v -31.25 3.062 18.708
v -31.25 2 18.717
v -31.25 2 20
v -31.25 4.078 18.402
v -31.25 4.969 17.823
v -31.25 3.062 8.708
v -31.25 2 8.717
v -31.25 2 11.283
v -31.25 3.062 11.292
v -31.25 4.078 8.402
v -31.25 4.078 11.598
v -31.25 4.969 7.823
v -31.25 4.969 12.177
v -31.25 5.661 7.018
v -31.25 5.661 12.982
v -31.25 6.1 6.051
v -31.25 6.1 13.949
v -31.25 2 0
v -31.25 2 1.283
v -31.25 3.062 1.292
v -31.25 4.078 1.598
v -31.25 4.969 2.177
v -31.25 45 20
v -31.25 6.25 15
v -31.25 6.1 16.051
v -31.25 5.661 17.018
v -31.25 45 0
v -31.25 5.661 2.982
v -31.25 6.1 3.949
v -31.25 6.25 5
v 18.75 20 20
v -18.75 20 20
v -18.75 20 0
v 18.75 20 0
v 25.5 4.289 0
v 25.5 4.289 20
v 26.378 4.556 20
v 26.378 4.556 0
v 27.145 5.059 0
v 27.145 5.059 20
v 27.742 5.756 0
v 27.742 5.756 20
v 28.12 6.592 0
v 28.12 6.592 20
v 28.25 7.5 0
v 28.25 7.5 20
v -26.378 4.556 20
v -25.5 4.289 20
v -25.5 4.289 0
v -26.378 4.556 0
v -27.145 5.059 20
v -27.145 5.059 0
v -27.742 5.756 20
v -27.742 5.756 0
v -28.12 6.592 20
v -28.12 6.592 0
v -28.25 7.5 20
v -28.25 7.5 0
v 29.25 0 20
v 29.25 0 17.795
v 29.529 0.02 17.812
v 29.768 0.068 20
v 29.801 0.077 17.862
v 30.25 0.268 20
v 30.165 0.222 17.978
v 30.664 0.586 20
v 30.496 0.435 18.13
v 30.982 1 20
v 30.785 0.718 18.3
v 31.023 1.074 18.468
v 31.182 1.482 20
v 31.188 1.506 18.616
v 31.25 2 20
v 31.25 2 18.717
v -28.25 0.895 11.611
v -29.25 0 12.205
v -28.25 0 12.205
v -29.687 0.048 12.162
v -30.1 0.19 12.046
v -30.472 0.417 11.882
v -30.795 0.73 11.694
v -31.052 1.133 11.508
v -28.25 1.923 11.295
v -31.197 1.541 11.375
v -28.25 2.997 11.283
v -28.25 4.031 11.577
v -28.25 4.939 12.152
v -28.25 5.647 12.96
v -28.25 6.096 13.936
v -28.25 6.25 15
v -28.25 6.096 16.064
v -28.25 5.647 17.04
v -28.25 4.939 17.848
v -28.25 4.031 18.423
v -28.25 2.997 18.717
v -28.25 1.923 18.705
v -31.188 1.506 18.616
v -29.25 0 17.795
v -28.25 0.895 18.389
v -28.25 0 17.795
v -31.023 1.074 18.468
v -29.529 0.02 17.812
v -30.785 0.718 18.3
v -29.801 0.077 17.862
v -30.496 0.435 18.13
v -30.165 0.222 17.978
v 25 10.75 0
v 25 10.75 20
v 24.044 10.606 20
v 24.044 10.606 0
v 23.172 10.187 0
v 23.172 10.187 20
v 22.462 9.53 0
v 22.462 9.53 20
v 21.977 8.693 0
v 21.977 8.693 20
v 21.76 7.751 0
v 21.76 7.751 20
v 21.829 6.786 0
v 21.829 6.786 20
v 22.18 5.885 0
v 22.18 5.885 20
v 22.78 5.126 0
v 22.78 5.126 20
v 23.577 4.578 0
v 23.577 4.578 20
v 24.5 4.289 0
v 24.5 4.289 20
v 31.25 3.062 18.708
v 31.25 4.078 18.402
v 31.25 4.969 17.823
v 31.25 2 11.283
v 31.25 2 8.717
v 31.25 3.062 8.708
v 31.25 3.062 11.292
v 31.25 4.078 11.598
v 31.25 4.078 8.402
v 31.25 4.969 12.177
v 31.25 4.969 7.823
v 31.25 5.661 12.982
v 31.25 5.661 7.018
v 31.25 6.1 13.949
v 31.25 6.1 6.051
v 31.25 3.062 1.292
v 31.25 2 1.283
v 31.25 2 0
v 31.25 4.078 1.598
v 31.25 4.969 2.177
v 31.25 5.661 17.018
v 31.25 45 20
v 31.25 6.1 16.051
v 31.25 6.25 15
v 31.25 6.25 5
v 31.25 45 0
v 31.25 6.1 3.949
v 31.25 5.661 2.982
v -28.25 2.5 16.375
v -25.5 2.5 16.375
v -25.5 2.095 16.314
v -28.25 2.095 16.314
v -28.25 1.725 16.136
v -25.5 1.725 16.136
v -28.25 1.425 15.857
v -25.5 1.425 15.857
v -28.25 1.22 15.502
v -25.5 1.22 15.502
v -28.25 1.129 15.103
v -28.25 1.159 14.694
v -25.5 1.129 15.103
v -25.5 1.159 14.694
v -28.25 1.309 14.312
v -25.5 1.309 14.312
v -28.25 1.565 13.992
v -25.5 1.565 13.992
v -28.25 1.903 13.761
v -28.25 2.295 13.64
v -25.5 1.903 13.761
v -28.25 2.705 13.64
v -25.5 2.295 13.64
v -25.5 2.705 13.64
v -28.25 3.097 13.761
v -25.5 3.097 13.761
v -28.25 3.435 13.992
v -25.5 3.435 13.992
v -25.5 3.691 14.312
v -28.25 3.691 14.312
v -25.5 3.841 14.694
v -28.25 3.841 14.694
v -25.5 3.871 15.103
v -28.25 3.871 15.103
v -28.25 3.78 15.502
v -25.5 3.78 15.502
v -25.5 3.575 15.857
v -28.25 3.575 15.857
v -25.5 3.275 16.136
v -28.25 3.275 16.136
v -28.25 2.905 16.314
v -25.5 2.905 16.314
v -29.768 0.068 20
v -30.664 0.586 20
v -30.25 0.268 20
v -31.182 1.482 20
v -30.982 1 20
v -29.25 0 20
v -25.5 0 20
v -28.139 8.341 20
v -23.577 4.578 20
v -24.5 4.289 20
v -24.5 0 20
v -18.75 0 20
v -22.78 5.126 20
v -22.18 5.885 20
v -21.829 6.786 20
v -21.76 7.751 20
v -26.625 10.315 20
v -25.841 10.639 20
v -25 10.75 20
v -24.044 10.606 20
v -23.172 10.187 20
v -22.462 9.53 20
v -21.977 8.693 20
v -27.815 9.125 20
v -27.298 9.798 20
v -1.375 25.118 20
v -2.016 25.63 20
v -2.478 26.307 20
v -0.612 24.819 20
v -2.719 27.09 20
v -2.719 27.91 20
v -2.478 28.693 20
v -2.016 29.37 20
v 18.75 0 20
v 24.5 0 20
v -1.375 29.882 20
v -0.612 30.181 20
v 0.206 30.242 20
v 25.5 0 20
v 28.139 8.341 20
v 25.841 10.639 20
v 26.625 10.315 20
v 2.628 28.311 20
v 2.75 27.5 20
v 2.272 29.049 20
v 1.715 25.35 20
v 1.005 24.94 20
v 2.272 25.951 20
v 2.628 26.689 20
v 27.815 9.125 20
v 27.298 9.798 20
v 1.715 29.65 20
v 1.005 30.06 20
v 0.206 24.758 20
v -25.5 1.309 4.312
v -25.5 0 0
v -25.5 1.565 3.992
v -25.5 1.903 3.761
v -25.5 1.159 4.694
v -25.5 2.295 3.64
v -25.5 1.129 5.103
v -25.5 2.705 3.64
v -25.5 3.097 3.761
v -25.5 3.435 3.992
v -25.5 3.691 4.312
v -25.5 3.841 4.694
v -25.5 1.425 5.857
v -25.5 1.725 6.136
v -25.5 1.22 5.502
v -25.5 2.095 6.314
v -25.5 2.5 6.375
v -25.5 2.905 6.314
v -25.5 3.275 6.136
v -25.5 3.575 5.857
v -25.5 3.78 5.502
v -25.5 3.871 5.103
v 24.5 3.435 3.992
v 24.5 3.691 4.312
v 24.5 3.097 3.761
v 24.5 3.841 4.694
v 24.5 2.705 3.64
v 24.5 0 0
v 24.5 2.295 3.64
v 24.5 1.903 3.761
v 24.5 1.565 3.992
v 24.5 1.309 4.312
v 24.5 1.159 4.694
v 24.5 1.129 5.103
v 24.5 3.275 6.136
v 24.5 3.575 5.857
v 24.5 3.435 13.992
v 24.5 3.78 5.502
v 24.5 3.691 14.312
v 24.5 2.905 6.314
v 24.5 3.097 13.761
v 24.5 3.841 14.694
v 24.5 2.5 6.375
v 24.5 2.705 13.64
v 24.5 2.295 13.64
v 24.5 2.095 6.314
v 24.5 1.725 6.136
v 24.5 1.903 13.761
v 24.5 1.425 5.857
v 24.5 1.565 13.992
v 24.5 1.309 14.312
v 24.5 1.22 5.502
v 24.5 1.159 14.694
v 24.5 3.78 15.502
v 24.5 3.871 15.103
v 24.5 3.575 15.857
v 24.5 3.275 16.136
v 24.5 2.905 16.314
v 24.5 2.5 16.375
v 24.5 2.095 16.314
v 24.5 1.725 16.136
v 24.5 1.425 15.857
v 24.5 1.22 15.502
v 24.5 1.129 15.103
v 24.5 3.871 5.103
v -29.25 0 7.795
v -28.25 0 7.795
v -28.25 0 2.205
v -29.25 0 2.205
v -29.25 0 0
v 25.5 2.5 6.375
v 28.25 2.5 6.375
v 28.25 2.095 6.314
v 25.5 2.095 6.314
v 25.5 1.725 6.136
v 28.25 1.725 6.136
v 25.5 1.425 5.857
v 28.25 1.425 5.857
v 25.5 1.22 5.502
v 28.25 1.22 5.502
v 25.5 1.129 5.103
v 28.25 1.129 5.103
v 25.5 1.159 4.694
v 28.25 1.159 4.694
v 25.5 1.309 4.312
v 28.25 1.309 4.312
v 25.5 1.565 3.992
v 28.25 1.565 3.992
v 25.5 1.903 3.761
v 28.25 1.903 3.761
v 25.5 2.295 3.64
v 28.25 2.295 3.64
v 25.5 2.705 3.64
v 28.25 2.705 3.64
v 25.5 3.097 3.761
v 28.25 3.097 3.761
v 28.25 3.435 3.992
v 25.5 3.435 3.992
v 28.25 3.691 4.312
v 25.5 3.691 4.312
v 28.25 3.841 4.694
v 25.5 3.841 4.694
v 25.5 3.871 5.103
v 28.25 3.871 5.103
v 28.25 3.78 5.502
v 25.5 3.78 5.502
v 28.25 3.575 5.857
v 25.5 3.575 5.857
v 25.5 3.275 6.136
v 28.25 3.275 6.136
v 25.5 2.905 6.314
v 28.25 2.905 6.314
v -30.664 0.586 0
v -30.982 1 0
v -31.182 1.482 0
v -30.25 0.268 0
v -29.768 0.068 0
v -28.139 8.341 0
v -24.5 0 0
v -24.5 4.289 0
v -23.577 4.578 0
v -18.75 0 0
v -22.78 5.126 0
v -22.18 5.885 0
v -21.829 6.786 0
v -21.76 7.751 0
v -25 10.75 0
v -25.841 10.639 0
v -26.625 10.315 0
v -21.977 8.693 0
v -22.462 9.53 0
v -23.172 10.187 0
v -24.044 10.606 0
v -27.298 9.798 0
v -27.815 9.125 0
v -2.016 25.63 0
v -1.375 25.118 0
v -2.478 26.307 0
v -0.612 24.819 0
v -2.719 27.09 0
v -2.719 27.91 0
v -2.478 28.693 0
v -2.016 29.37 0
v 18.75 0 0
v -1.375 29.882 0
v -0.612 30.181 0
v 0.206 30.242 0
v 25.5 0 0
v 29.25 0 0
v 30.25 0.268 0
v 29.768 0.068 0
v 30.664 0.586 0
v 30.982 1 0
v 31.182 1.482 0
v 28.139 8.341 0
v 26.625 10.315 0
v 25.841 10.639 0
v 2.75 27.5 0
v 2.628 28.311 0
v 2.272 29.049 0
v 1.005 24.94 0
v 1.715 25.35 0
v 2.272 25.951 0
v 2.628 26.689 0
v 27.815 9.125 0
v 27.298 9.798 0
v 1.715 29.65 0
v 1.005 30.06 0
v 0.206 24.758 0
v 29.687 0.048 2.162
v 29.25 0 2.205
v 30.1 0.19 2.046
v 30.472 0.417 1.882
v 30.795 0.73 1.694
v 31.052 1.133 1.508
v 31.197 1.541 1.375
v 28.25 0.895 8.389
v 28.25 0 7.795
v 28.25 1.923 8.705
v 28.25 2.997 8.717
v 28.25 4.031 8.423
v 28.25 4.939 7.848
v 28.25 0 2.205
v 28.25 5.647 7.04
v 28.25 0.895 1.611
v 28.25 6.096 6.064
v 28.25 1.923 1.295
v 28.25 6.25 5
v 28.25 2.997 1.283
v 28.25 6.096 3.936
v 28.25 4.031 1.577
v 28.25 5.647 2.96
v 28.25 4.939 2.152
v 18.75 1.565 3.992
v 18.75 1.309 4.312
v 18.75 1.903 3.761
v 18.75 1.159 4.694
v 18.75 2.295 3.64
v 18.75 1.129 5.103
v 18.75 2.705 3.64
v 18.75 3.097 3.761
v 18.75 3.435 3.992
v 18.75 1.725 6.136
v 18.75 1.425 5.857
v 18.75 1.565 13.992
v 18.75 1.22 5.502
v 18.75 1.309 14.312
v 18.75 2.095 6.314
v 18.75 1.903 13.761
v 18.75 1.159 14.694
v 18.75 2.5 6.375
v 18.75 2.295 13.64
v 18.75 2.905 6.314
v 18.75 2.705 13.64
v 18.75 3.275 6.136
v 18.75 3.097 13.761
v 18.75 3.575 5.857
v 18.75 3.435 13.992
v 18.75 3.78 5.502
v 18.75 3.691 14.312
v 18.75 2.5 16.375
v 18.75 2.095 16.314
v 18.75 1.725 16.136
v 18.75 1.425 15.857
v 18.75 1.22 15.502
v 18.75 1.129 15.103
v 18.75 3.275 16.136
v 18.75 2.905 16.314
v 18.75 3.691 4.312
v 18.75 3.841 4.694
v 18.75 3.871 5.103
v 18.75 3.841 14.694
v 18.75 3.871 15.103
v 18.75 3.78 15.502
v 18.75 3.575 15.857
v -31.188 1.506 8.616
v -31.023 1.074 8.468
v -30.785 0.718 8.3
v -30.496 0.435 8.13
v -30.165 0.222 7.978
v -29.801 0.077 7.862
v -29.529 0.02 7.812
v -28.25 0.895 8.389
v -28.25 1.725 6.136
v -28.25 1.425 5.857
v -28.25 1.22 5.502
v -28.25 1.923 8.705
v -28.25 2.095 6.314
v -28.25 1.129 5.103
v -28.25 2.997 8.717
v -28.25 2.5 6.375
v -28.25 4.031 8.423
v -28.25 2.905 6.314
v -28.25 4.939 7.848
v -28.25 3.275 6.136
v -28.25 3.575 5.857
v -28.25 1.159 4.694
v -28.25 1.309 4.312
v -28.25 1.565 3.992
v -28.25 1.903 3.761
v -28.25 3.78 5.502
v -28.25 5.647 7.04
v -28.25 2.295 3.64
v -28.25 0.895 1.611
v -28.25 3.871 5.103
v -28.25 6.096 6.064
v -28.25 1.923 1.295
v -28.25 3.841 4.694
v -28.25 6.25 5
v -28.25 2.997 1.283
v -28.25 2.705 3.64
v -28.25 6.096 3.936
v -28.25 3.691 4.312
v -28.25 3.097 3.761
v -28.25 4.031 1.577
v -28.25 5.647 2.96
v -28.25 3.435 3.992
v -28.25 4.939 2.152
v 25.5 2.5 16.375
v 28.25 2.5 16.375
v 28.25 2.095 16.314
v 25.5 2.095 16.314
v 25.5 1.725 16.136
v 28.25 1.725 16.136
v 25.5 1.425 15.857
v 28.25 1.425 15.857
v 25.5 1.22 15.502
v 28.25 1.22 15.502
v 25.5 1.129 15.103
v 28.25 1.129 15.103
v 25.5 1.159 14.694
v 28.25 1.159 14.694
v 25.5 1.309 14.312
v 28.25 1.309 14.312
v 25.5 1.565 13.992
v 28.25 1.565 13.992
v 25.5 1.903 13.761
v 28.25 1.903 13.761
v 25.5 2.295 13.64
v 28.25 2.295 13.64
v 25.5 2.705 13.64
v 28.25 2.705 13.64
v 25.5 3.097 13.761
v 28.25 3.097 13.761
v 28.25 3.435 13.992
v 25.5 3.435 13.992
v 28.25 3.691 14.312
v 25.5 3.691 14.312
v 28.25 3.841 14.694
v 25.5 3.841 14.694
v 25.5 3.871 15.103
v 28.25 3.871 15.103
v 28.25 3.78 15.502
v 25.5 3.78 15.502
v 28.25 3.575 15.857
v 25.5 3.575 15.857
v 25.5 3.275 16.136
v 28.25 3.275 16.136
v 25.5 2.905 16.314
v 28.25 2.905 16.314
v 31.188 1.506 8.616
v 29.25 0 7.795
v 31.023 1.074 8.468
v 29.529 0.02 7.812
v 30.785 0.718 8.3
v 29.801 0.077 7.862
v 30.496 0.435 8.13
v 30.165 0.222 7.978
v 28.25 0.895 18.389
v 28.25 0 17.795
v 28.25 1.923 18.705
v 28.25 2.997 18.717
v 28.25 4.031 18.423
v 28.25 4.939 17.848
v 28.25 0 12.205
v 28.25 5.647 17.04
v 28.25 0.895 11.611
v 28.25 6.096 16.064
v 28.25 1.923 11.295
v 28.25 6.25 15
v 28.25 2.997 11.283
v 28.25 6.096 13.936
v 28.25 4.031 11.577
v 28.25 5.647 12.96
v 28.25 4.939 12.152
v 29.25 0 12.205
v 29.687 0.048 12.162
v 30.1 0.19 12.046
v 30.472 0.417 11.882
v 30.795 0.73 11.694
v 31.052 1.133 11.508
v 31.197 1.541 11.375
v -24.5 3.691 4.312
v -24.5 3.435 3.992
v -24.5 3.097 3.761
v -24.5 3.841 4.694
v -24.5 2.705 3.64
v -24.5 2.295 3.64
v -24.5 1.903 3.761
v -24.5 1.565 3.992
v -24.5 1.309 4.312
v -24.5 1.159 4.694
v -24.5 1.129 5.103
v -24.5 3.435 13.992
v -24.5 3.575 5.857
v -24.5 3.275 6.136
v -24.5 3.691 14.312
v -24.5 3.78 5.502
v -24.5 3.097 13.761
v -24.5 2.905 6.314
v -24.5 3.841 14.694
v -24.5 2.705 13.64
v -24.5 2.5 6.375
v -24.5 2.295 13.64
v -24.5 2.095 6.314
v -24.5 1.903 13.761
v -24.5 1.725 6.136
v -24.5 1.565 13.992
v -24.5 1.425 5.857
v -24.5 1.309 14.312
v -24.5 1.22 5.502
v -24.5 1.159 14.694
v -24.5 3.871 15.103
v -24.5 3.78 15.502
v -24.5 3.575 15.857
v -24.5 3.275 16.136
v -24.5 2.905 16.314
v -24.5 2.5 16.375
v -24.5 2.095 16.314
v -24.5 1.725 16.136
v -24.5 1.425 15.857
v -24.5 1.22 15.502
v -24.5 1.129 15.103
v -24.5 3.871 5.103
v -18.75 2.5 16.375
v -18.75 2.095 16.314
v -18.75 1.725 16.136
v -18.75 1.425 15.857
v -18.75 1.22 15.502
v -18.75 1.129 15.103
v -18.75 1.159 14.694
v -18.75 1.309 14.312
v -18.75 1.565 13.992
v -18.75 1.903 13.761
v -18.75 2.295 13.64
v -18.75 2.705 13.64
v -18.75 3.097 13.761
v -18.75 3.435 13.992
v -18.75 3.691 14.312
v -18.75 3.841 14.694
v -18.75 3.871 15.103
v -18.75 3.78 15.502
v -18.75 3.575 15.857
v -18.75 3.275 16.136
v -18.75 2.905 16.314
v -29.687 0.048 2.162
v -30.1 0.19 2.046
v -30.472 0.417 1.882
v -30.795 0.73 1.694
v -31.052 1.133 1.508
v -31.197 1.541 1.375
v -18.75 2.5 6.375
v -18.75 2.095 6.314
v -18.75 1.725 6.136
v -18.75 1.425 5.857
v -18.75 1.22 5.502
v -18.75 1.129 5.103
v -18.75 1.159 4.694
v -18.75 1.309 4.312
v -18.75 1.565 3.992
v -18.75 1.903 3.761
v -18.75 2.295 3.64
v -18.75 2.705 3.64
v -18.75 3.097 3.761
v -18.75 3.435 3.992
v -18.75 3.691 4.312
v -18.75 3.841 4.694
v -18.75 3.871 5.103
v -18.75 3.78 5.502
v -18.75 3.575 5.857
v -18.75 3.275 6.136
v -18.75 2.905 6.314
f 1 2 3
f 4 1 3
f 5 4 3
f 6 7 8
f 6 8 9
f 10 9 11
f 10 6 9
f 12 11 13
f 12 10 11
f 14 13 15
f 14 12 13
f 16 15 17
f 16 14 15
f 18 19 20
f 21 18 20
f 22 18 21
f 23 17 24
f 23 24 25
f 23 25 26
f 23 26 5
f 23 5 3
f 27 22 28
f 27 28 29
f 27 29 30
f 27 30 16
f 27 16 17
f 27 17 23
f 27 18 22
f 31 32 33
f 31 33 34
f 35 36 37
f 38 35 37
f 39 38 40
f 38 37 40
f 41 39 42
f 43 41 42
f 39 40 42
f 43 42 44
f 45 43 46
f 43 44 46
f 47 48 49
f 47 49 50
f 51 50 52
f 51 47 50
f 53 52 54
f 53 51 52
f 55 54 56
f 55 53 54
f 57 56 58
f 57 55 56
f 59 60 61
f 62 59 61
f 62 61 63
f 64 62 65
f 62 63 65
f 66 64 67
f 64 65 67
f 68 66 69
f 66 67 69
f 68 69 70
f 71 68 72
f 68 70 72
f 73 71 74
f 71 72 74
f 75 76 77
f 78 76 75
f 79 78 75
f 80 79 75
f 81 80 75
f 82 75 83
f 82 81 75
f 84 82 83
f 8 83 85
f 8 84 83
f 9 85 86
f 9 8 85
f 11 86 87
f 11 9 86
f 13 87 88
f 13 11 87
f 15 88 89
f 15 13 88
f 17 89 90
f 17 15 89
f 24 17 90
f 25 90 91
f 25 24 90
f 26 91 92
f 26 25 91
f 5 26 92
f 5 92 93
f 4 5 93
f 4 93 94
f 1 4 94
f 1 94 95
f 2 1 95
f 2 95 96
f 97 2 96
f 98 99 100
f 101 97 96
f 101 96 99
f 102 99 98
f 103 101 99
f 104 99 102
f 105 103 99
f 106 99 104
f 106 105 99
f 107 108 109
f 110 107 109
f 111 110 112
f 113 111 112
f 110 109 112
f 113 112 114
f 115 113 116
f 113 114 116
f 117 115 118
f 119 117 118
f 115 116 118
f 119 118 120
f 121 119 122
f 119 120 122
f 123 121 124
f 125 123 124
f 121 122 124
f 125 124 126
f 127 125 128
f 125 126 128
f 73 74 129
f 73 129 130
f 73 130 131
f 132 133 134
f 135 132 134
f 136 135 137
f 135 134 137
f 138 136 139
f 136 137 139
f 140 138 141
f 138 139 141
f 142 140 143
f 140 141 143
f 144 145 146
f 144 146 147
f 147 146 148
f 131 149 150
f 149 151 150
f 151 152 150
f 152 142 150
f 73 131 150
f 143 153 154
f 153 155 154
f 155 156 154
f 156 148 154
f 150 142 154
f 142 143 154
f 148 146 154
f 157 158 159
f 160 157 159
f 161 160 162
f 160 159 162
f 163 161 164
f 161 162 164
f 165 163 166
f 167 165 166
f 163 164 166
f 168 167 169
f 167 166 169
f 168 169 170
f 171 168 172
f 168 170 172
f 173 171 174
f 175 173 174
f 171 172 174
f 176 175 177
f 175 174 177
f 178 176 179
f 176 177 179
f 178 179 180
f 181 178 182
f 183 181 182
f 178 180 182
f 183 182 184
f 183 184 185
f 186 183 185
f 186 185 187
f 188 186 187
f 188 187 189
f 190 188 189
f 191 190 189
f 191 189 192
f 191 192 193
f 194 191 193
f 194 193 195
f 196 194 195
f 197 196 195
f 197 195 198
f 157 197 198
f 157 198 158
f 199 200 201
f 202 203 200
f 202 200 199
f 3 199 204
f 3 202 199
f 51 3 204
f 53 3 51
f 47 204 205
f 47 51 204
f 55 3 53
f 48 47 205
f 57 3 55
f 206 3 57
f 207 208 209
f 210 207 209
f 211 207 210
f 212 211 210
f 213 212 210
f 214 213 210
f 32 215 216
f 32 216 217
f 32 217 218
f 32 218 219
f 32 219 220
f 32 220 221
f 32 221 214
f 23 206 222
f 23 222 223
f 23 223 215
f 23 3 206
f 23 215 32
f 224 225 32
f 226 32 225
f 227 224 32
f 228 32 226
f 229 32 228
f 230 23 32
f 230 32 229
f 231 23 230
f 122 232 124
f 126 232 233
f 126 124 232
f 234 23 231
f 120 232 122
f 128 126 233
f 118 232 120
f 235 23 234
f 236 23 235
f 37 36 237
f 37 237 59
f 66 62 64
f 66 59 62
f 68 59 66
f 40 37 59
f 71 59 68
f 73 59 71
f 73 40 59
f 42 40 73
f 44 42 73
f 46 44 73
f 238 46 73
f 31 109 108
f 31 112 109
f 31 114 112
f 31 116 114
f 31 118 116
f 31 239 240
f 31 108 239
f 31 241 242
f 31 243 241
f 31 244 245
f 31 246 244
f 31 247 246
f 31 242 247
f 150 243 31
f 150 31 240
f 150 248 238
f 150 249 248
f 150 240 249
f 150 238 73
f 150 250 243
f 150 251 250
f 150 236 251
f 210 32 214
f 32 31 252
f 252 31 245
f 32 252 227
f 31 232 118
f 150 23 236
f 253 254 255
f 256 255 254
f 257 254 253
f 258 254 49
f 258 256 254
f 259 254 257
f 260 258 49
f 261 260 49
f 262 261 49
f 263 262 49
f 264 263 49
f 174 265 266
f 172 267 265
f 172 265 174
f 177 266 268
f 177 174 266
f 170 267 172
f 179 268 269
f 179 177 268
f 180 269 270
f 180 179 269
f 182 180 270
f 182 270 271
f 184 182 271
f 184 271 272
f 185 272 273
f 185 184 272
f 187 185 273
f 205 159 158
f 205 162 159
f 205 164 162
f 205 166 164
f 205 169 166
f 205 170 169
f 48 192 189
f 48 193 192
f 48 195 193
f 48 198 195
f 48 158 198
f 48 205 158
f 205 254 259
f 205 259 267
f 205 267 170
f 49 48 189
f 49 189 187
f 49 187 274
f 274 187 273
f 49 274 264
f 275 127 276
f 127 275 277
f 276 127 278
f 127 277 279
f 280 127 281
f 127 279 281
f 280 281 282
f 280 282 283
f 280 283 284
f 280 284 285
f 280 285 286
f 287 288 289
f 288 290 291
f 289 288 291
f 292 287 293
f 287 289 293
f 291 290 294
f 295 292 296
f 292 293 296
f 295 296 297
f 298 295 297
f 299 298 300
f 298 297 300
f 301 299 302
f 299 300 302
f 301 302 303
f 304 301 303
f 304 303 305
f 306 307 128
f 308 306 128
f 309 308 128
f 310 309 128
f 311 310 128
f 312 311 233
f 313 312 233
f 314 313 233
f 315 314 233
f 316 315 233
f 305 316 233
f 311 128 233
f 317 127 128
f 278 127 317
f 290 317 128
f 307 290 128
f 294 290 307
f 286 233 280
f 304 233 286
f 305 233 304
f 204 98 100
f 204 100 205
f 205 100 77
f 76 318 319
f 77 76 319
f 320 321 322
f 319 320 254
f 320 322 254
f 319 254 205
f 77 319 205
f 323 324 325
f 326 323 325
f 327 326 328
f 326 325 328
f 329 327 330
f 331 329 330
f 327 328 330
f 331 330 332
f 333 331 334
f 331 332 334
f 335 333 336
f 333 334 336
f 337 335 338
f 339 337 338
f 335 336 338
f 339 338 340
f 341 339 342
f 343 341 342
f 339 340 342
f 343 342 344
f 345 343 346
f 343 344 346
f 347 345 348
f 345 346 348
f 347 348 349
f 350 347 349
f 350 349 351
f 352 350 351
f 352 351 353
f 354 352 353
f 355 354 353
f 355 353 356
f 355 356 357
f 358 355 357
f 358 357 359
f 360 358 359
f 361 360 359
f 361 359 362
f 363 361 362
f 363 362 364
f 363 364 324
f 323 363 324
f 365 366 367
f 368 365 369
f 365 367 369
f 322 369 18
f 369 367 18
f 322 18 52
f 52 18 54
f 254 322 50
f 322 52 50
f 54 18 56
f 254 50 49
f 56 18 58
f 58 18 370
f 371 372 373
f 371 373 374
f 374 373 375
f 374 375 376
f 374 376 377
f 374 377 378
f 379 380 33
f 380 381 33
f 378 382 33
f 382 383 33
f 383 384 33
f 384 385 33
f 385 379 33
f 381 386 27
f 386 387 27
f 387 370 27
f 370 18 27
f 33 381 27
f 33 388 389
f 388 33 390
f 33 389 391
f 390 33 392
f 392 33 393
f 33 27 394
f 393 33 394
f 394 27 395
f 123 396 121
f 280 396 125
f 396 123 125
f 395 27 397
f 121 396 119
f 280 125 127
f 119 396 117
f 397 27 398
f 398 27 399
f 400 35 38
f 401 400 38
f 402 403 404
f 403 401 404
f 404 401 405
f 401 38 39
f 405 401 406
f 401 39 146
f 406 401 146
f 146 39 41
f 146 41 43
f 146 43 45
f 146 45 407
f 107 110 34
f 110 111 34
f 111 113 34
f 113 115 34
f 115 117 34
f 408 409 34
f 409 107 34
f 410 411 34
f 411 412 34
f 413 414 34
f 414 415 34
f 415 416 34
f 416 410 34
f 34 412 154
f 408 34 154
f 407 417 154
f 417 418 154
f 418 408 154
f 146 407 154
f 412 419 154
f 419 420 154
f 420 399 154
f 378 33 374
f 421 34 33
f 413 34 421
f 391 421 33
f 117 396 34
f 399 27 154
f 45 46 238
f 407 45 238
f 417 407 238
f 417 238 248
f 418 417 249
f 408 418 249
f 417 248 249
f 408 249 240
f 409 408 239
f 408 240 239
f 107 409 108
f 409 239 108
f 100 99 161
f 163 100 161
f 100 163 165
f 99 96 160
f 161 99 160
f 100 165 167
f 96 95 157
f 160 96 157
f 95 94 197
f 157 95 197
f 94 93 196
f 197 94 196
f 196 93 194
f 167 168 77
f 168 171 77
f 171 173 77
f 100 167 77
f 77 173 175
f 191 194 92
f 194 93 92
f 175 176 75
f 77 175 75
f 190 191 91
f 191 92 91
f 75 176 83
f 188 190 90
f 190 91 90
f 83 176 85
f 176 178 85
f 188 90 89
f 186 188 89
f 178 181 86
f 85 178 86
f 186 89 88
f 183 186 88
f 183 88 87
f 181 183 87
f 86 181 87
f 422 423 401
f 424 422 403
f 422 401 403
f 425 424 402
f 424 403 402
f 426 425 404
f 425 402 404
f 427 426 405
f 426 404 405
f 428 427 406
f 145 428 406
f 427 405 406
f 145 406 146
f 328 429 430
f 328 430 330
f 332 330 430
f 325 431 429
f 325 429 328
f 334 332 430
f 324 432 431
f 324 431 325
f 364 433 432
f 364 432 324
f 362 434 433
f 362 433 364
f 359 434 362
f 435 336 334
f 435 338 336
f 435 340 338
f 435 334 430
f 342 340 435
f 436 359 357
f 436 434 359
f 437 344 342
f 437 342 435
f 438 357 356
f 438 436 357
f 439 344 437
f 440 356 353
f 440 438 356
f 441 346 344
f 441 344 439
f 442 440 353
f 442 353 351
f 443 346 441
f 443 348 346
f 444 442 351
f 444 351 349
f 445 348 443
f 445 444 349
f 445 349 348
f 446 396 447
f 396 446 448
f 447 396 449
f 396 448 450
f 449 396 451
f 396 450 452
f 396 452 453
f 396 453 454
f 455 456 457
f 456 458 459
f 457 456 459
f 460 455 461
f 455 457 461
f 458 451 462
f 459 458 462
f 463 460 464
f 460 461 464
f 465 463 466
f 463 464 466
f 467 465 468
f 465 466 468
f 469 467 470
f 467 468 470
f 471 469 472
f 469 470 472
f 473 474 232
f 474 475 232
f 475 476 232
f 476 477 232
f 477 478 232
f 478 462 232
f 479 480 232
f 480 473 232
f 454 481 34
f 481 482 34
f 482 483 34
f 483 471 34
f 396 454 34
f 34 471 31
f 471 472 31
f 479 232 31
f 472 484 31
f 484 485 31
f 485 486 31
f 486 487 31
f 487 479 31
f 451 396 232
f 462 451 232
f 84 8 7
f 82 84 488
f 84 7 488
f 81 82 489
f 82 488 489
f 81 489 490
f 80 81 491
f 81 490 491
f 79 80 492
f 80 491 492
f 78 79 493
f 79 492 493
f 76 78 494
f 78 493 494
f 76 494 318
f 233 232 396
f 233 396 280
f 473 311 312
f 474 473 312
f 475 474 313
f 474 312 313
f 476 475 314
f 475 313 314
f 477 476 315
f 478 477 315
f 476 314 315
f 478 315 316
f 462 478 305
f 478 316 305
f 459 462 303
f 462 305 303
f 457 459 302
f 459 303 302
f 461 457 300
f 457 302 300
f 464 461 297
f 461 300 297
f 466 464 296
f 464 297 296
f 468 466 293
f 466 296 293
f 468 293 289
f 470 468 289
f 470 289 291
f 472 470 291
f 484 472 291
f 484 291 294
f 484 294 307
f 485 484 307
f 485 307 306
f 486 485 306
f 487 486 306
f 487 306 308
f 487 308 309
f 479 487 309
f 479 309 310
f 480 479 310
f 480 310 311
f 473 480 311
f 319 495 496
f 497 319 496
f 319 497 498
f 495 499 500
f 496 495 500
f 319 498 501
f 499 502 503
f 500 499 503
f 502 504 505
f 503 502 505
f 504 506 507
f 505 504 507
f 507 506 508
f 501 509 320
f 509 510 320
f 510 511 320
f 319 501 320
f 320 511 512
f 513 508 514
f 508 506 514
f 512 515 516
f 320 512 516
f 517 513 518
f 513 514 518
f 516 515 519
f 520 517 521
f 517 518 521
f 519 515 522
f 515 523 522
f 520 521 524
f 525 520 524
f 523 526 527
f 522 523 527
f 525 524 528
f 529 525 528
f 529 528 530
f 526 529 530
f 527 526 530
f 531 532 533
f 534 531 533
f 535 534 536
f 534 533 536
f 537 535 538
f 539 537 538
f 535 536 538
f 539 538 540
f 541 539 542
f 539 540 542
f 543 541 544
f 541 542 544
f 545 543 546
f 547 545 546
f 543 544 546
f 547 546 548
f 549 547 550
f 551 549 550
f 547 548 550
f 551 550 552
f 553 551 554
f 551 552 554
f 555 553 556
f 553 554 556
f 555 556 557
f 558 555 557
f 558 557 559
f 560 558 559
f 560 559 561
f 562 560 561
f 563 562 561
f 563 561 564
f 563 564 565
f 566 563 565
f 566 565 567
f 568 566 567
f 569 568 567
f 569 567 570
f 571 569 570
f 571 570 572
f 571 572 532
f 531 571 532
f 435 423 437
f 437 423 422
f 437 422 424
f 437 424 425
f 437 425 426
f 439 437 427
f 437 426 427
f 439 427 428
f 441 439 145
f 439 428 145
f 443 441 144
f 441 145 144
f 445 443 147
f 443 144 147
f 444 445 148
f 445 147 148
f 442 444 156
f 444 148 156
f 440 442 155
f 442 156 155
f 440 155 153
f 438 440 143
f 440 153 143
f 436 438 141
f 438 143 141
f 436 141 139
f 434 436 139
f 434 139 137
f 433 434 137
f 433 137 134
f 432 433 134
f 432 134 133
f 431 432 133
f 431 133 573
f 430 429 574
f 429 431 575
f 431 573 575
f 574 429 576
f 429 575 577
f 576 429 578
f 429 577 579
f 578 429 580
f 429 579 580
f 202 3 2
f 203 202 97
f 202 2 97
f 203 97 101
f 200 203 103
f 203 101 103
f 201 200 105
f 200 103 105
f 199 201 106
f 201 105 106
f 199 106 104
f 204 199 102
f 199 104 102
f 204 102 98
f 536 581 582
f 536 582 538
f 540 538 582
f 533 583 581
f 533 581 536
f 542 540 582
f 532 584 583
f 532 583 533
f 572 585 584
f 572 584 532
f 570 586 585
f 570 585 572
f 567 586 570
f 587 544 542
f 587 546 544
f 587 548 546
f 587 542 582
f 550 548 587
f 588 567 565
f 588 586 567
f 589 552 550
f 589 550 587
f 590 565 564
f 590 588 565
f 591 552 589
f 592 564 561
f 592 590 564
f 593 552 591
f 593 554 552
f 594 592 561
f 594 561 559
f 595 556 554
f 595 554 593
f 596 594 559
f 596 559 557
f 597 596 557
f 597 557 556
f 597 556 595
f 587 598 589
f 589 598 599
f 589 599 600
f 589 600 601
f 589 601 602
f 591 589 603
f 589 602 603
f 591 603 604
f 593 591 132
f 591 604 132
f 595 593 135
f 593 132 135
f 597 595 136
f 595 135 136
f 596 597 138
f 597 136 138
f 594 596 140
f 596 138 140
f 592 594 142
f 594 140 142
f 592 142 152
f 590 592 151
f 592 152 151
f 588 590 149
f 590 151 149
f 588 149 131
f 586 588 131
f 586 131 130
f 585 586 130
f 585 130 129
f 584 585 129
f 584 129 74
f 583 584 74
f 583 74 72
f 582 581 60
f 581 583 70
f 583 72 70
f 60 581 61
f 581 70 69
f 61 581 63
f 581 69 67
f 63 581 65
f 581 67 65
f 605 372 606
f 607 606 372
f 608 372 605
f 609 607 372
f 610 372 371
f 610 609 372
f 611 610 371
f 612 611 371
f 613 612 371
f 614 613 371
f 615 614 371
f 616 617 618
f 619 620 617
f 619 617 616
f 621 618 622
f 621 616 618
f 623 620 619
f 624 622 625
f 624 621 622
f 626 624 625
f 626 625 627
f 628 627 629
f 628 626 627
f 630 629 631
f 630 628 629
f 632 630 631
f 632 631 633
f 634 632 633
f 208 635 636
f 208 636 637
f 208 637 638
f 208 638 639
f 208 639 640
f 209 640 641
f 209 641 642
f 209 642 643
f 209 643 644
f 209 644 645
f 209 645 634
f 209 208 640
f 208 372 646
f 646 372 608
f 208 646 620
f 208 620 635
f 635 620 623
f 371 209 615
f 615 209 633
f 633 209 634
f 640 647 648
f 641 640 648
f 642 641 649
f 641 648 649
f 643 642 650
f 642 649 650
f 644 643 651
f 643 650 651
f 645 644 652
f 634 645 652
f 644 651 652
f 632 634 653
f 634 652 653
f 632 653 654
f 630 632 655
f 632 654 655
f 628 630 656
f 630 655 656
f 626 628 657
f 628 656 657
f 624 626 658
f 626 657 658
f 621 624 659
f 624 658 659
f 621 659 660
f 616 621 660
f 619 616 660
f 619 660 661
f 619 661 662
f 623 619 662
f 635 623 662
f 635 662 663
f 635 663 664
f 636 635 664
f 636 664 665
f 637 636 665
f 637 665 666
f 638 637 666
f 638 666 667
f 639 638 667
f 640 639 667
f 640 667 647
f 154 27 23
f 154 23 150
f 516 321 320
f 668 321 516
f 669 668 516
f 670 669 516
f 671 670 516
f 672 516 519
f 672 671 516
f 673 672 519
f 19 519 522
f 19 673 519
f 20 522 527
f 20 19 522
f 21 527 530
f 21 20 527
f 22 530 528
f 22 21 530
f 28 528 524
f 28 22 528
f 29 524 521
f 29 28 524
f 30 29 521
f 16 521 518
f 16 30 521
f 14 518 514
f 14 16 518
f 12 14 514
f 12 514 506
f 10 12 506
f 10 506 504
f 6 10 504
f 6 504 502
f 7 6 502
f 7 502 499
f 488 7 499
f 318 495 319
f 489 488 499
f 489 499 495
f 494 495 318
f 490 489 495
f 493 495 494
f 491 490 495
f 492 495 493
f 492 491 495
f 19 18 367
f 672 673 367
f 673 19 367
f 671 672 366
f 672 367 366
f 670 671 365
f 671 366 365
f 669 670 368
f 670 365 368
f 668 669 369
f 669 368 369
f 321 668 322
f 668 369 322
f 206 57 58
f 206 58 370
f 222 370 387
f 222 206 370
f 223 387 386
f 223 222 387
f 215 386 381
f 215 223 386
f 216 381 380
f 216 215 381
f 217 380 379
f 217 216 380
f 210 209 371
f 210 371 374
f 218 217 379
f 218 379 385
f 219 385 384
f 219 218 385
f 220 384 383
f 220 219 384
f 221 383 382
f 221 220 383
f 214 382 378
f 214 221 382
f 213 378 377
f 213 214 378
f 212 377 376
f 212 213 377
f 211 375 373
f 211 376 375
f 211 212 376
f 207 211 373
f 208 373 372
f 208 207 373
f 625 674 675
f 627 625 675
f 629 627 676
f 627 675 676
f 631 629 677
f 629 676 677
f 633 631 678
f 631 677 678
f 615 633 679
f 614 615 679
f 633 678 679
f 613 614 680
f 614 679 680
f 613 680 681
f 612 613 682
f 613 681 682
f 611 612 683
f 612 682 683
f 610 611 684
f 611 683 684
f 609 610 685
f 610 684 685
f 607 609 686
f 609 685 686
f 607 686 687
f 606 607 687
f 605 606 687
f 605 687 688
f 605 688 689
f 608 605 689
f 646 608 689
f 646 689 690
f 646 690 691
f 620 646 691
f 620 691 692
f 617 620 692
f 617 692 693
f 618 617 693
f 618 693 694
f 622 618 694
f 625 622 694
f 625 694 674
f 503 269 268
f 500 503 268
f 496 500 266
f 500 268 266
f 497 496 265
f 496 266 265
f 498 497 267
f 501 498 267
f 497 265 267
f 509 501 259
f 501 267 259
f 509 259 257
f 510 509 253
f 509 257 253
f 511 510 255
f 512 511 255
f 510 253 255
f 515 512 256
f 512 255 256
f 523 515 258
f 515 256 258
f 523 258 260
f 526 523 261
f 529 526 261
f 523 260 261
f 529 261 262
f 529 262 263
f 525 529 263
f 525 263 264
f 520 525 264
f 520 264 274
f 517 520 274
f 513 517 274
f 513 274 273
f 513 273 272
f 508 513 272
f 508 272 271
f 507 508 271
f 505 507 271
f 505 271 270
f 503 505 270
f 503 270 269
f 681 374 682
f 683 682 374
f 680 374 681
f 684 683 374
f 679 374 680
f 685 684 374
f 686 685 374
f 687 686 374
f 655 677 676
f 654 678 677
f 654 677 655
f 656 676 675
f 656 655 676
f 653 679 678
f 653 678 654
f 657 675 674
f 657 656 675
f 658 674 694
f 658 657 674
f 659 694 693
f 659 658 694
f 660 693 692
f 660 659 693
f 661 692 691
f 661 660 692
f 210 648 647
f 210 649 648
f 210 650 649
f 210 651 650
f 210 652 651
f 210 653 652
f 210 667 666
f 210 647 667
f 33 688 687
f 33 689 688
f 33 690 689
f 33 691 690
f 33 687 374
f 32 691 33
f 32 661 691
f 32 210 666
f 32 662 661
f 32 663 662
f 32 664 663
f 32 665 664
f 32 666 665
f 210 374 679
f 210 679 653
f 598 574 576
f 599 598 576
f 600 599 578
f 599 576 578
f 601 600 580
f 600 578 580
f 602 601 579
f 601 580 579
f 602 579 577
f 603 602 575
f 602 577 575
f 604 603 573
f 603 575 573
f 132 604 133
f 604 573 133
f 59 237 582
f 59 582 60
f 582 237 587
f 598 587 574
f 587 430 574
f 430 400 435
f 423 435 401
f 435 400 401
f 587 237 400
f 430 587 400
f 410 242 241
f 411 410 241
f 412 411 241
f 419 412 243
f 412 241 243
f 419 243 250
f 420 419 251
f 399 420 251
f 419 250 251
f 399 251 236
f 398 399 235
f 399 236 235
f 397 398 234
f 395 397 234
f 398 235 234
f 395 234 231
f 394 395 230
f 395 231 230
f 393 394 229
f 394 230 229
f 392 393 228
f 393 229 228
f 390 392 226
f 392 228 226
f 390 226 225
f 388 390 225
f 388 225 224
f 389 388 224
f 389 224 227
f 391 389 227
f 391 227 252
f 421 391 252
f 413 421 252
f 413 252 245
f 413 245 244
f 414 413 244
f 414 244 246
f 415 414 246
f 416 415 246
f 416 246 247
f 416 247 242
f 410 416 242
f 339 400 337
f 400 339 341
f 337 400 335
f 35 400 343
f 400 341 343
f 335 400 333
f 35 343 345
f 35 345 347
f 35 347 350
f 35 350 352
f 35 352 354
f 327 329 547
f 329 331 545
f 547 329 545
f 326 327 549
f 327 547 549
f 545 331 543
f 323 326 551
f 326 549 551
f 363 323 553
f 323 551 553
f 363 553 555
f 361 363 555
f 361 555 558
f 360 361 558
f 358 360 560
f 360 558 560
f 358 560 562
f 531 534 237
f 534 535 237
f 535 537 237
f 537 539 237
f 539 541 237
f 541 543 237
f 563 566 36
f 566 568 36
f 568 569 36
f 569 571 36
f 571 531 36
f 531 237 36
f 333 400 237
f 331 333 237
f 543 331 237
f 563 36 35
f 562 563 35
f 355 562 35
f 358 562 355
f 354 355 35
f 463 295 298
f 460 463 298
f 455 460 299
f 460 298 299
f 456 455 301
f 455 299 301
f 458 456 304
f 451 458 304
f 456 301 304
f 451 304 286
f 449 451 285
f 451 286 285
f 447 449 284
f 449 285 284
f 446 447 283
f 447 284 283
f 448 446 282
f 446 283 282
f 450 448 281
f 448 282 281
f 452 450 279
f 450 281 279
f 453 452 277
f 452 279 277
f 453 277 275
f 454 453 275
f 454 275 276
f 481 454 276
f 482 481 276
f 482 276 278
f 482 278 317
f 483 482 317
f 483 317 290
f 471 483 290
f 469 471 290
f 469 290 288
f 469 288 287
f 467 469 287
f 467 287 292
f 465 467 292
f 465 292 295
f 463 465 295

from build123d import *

# Parameters (mm, degrees)
SKETCH1_W           = 62.5
SKETCH1_H           = 45
BOSS_EXTRUDE1_DEPTH = 20
CUT_EXTRUDE10_DEPTH = 59.322915736
SKETCH18_W          = 37.5
SKETCH18_H          = 20
CUT_EXTRUDE13_DEPTH = 59.322915736
SKETCH19_R          = 2.75
CUT_EXTRUDE14_DEPTH = 59.322915736
SKETCH20_R          = 1.375
CUT_EXTRUDE15_DEPTH = 80.569152314
FILLET1_R           = 2
SKETCH21_R          = 3.75
CUT_EXTRUDE16_DEPTH = 3


with BuildPart() as part:
    # Sketch1 → Boss-Extrude1 (new body)
    with BuildSketch(Plane.XY):
        with Locations((0, 22.5)):
            Rectangle(SKETCH1_W, SKETCH1_H)
    extrude(amount=BOSS_EXTRUDE1_DEPTH)

    # Sketch14 → Cut-Extrude10 (cut, through all)
    with BuildSketch(Plane.XY.offset(20)):
        with BuildLine():
            ThreePointArc((24.5, 4.288691855), (24.749252587, 4.259687402), (25, 4.25))
            Line((25, 4.25), (25, 10.75))
            ThreePointArc((25, 10.75), (21.759687402, 7.750747413), (24.5, 4.288691855))
        make_face()
        with BuildLine():
            Line((25, 10.75), (25, 4.25))
            ThreePointArc((25, 4.25), (25.250747413, 4.259687402), (25.5, 4.288691855))
            ThreePointArc((25.5, 4.288691855), (27.468552207, 5.386058184), (28.25, 7.5))
            ThreePointArc((28.25, 7.5), (27.298097039, 9.798097039), (25, 10.75))
        make_face()
        with BuildLine():
            Line((24.5, 0), (25, 0))
            Line((25, 0), (25, 4.25))
            ThreePointArc((25, 4.25), (24.749252587, 4.259687402), (24.5, 4.288691855))
            Line((24.5, 4.288691855), (24.5, 0))
        make_face()
        with BuildLine():
            Line((25, 4.25), (25, 0))
            Line((25, 0), (25.5, 0))
            Line((25.5, 0), (25.5, 4.288691855))
            ThreePointArc((25.5, 4.288691855), (25.250747413, 4.259687402), (25, 4.25))
        make_face()
    cut_extrude10 = extrude(amount=-CUT_EXTRUDE10_DEPTH, mode=Mode.SUBTRACT)

    # Mirror1: Cut-Extrude10 across plane
    add(cut_extrude10.mirror(Plane(origin=(0, 0, 0), x_dir=(0, 0, 1), z_dir=(1, 0, 0))), mode=Mode.SUBTRACT)

    # Sketch18 → Cut-Extrude13 (cut, through all)
    with BuildSketch(Plane.XY.offset(20)):
        with Locations((0, 10)):
            Rectangle(SKETCH18_W, SKETCH18_H)
    extrude(amount=-CUT_EXTRUDE13_DEPTH, mode=Mode.SUBTRACT)

    # Sketch19 → Cut-Extrude14 (cut, through all)
    with BuildSketch(Plane.XY.offset(20)):
        with Locations((0, 27.5)):
            Circle(SKETCH19_R)
    extrude(amount=-CUT_EXTRUDE14_DEPTH, mode=Mode.SUBTRACT)

    # Sketch20 → Cut-Extrude15 (cut, through all)
    with BuildSketch(Plane(origin=(31.25, 0, 0), x_dir=(0, 0, -1), z_dir=(1, 0, 0))):
        with Locations(Location((-5, 2.5, 0), (0, 0, 180))):
            Circle(SKETCH20_R)
        with Locations(Location((-15, 2.5, 0), (0, 0, 180))):
            Circle(SKETCH20_R)
    extrude(amount=-CUT_EXTRUDE15_DEPTH, mode=Mode.SUBTRACT)

    # Fillet1
    # the kernel refuses this fillet: 2 mm, written as the material it takes off along each edge
    with BuildSketch(Plane(origin=(31.25, 0, -5), x_dir=(0, 1, 0), z_dir=(0, 0, 1)), Plane(origin=(-31.25, 0, -5), x_dir=(1, 0, 0), z_dir=(0, 0, 1))) as fillet1_piece_1:
        with BuildLine():
            CenterArc((FILLET1_R, FILLET1_R), FILLET1_R, 180, 90)
            Line((0, FILLET1_R), (0, 0))
            Line((0, 0), (FILLET1_R, 0))
        make_face()
    extrude(amount=30, mode=Mode.SUBTRACT)

    # Sketch21 → Cut-Extrude16 (cut)
    with BuildSketch(Plane(origin=(31.25, 0, 0), x_dir=(0, 0, -1), z_dir=(1, 0, 0))):
        with Locations((-5, 2.5)):
            Circle(SKETCH21_R)
        with Locations((-15, 2.5)):
            Circle(SKETCH21_R)
    cut_extrude16 = extrude(amount=-CUT_EXTRUDE16_DEPTH, mode=Mode.SUBTRACT)

    # Mirror2: Cut-Extrude16 across plane
    add(cut_extrude16.mirror(Plane(origin=(0, 0, 0), x_dir=(0, 0, 1), z_dir=(1, 0, 0))), mode=Mode.SUBTRACT)


solid = part.part
